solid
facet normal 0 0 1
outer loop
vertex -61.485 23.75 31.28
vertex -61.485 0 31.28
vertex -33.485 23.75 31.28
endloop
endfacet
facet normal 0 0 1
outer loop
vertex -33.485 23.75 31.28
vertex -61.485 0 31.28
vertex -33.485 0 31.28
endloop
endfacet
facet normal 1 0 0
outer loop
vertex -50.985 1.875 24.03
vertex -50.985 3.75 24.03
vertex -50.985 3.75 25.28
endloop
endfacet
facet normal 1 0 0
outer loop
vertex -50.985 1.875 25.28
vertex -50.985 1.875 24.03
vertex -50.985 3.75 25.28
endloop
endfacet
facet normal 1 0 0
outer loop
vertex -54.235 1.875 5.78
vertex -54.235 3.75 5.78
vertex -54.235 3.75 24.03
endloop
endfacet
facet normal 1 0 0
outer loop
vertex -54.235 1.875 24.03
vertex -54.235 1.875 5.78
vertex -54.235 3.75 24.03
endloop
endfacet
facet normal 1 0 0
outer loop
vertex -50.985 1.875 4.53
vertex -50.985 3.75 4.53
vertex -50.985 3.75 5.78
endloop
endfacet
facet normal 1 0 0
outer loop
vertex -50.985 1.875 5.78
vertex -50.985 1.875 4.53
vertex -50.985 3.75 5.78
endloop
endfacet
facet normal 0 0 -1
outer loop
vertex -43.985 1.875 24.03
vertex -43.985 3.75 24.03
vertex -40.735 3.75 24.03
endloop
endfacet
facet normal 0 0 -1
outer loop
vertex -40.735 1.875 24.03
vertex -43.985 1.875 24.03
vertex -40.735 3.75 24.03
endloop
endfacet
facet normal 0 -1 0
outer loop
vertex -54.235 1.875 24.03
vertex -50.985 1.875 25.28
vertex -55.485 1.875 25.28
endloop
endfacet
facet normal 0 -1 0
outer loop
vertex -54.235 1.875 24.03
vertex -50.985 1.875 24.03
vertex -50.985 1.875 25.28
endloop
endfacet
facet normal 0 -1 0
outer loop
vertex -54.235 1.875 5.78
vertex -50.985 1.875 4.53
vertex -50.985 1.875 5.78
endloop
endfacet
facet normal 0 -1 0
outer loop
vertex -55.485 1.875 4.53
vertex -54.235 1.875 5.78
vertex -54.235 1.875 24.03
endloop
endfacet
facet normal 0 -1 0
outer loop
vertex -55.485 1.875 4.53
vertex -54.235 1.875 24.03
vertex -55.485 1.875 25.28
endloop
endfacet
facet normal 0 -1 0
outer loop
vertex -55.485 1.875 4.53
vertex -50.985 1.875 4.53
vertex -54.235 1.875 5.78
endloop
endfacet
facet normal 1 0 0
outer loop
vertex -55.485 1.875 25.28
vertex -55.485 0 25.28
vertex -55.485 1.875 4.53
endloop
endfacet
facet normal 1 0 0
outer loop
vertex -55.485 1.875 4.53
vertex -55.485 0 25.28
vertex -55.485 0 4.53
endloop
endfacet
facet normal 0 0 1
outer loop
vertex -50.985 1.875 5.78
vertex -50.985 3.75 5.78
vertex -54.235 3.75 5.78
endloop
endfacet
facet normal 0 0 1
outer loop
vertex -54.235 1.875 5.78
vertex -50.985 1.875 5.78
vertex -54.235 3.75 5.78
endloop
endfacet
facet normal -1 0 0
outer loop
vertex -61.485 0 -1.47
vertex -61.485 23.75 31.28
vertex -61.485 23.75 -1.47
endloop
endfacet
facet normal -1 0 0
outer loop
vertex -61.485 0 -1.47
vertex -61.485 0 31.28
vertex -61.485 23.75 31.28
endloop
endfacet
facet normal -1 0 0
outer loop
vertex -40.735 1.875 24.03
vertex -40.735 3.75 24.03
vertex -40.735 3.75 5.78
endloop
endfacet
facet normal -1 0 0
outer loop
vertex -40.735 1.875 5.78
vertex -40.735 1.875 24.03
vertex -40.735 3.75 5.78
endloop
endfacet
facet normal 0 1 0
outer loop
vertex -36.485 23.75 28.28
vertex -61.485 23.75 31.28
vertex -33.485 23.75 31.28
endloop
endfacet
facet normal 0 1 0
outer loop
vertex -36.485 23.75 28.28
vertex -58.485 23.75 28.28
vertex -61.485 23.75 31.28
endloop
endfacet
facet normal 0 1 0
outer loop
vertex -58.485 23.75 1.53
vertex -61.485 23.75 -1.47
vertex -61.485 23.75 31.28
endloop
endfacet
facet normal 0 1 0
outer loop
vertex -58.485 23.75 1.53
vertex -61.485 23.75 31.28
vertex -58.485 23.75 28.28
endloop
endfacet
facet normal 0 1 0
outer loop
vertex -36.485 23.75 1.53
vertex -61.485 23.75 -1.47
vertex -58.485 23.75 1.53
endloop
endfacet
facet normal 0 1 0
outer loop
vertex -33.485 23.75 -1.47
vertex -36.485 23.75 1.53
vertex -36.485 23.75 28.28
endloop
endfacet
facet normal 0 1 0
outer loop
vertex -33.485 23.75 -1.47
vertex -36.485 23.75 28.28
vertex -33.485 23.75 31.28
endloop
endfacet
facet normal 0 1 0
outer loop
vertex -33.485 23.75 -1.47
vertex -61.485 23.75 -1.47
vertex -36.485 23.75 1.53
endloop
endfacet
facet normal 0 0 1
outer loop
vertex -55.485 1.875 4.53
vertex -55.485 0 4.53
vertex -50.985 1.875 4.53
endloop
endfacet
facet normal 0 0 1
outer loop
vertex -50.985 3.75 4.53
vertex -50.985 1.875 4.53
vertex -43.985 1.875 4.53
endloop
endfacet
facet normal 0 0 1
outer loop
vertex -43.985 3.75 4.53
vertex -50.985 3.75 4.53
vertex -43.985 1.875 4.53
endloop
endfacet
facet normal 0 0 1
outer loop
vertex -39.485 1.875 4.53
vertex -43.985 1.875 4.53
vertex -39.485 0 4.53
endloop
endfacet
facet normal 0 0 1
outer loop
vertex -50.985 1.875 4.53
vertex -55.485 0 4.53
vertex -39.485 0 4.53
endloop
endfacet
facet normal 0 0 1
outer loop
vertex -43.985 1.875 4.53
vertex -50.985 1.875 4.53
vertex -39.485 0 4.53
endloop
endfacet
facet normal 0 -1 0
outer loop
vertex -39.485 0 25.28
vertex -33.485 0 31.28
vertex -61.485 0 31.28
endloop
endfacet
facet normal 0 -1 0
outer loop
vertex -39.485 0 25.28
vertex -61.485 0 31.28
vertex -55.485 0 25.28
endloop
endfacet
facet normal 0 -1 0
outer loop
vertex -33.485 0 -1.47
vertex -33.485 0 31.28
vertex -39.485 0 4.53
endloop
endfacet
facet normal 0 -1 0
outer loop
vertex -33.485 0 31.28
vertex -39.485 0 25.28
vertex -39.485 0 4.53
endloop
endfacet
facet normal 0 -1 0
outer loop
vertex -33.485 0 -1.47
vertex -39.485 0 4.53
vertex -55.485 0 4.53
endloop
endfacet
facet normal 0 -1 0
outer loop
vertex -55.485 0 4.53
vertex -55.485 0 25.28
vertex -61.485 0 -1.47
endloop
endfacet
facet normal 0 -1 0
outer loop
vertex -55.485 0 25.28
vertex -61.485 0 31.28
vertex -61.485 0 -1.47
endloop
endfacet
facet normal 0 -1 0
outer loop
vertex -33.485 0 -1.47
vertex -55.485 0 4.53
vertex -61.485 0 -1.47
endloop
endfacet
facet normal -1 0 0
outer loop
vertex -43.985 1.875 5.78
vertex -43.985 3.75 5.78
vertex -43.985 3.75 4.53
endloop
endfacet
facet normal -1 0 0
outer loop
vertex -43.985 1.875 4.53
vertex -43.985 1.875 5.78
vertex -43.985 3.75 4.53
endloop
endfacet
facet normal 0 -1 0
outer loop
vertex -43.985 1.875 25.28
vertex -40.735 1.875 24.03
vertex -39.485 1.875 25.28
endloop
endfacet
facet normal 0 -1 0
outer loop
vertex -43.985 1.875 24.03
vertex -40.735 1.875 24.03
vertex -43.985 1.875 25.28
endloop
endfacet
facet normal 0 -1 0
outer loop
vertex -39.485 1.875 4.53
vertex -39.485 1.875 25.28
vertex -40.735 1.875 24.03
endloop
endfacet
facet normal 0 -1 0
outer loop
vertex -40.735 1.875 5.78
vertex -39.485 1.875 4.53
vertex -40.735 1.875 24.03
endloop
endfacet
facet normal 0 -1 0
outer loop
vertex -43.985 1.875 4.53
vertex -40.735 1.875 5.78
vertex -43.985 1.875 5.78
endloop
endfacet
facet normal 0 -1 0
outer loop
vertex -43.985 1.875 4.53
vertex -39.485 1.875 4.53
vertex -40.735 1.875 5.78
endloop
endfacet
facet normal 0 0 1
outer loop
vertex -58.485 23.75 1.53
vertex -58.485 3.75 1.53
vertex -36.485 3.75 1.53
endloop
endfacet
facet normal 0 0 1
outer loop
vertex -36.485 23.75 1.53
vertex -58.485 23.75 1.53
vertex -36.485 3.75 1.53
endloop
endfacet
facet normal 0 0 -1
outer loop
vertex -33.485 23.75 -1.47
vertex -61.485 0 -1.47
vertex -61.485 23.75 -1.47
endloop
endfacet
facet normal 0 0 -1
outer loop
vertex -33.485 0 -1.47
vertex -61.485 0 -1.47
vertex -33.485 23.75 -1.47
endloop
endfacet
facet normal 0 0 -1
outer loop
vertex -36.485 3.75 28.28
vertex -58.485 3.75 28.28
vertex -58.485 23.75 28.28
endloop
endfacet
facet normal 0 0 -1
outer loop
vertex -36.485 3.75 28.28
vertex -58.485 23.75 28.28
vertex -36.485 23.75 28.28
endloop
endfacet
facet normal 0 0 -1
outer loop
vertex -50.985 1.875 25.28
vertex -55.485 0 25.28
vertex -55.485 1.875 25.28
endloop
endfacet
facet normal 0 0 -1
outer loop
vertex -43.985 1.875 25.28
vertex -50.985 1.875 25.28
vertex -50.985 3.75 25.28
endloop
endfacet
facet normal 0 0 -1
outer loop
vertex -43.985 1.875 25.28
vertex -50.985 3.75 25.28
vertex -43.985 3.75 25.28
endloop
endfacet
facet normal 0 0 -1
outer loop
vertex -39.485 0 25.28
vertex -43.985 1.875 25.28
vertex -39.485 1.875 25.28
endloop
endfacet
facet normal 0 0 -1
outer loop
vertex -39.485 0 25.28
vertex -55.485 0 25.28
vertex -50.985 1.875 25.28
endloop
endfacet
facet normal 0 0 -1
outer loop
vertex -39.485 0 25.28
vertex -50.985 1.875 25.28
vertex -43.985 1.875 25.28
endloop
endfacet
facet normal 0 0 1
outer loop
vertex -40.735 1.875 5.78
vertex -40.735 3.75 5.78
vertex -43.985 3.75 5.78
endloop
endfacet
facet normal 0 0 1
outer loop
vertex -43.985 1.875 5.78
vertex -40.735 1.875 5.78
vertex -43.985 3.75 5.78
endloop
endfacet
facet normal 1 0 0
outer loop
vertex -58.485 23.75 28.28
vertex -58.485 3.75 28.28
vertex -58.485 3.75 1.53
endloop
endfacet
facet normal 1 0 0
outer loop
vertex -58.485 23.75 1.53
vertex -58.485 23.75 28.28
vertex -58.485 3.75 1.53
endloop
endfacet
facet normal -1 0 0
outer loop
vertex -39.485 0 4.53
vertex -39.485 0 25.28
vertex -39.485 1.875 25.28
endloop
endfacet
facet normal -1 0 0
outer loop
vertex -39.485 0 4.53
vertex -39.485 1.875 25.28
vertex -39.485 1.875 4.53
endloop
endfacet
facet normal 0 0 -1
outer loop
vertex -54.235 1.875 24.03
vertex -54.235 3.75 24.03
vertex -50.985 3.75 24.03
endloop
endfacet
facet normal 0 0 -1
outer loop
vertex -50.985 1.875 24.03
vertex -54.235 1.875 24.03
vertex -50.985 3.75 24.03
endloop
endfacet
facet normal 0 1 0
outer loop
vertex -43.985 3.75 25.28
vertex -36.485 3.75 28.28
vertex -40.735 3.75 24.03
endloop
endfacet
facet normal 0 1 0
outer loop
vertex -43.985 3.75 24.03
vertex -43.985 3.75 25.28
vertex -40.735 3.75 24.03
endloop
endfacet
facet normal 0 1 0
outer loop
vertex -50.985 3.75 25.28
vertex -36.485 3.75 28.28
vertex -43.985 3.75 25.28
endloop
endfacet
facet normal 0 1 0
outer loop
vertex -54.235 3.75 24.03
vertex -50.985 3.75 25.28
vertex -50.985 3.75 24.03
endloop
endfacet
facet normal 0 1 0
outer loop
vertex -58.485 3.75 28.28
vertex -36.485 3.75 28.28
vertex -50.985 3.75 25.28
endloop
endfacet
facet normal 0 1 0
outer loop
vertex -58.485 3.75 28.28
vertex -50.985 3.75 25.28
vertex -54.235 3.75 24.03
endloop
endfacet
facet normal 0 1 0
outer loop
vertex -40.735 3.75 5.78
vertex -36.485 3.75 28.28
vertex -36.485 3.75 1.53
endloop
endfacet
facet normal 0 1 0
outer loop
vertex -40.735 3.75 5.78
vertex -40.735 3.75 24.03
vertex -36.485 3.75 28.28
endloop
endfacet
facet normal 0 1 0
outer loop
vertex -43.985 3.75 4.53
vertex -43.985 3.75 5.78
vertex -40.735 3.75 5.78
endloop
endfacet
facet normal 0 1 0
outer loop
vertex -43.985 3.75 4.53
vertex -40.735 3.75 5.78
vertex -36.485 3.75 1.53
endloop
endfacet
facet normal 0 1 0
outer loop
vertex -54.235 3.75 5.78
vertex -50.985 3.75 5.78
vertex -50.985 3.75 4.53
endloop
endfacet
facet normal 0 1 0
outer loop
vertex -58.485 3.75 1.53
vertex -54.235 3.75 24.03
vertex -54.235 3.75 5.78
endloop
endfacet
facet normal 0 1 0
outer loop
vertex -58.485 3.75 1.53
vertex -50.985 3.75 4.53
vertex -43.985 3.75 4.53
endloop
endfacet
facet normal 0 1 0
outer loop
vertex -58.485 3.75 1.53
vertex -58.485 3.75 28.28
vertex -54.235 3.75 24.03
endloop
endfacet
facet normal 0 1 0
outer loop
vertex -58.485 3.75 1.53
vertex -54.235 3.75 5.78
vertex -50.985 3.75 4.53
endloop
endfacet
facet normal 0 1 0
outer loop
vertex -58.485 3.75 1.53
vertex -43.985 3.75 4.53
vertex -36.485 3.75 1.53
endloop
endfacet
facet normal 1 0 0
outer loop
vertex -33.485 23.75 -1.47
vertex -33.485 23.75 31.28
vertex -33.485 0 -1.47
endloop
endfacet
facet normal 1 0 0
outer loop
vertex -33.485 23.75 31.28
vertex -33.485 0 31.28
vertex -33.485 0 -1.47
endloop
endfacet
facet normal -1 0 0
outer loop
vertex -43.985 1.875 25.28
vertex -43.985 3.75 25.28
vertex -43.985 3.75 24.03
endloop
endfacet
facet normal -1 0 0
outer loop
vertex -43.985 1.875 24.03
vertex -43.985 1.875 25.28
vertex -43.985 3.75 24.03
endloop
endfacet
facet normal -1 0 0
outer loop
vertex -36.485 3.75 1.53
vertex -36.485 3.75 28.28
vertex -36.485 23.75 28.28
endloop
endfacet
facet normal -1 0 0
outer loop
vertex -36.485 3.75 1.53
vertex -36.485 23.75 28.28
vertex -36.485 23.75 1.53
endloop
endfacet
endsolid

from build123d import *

# Parameters (mm, degrees)
SKETCH1_W           = 22
SKETCH1_H           = 26.75
SKETCH1_W_2         = 16
SKETCH1_H_2         = 20.75
BOSS_EXTRUDE2_DEPTH = 3.75
BOSS_EXTRUDE3_DEPTH = 1.875
SKETCH3_W           = 22
SKETCH3_H           = 3.75
BOSS_EXTRUDE4_DEPTH = 3
SKETCH4_W           = 29.75
SKETCH4_H           = 3.75
BOSS_EXTRUDE5_DEPTH = 3
SKETCH5_W           = 25
SKETCH5_H           = 3.75
BOSS_EXTRUDE6_DEPTH = 3
SKETCH6_W           = 32.75
SKETCH6_H           = 3.75
BOSS_EXTRUDE7_DEPTH = 3
SKETCH7_W           = 28
SKETCH7_H           = 32.75
SKETCH7_W_2         = 22
SKETCH7_H_2         = 26.75
BOSS_EXTRUDE8_DEPTH = 20


with BuildPart() as part:
    # Sketch1 → Boss-Extrude2 (new body)
    with BuildSketch(Plane(origin=(0, 0, 0), x_dir=(1, 0, 0), z_dir=(0, 1, 0))):
        with Locations((-47.484558715, -14.904779002)):
            Rectangle(SKETCH1_W, SKETCH1_H)
        with Locations((-47.484558715, -14.904779002)):
            Rectangle(SKETCH1_W_2, SKETCH1_H_2, mode=Mode.SUBTRACT)
    extrude(amount=BOSS_EXTRUDE2_DEPTH)

    # Sketch2 → Boss-Extrude3 (add)
    with BuildSketch(Plane(origin=(0, 3.75, 0), x_dir=(1, 0, 0), z_dir=(0, 1, 0))):
        Polygon((-50.984558715, -25.279779002), (-55.484558715, -25.279779002), (-55.484558715, -4.529779002), (-50.984558715, -4.529779002), (-50.984558715, -5.779779002), (-54.234558715, -5.779779002), (-54.234558715, -24.029779002), (-50.984558715, -24.029779002), align=None)
        Polygon((-43.984558715, -4.529779002), (-39.484558715, -4.529779002), (-39.484558715, -25.279779002), (-43.984558715, -25.279779002), (-43.984558715, -24.029779002), (-40.734558715, -24.029779002), (-40.734558715, -5.779779002), (-43.984558715, -5.779779002), align=None)
    extrude(amount=-BOSS_EXTRUDE3_DEPTH)

    # Sketch3 → Boss-Extrude4 (add)
    with BuildSketch(Plane(origin=(0, 0, 1.529779002), x_dir=(-1, 0, 0), z_dir=(0, 0, -1))):
        with Locations((47.484558715, 1.875)):
            Rectangle(SKETCH3_W, SKETCH3_H)
    extrude(amount=BOSS_EXTRUDE4_DEPTH)

    # Sketch4 → Boss-Extrude5 (add)
    with BuildSketch(Plane.ZY.offset(58.484558715)):
        with Locations((13.404779002, 1.875)):
            Rectangle(SKETCH4_W, SKETCH4_H)
    extrude(amount=BOSS_EXTRUDE5_DEPTH)

    # Sketch5 → Boss-Extrude6 (add)
    with BuildSketch(Plane.XY.offset(28.279779002)):
        with Locations((-48.984558715, 1.875)):
            Rectangle(SKETCH5_W, SKETCH5_H)
    extrude(amount=BOSS_EXTRUDE6_DEPTH)

    # Sketch6 → Boss-Extrude7 (add)
    with BuildSketch(Plane(origin=(-36.484558715, 0, 0), x_dir=(0, 0, -1), z_dir=(1, 0, 0))):
        with Locations((-14.904779002, 1.875)):
            Rectangle(SKETCH6_W, SKETCH6_H)
    extrude(amount=BOSS_EXTRUDE7_DEPTH)

    # Sketch7 → Boss-Extrude8 (add)
    with BuildSketch(Plane(origin=(0, 3.75, 0), x_dir=(1, 0, 0), z_dir=(0, 1, 0))):
        with Locations((-47.484558715, -14.904779002)):
            Rectangle(SKETCH7_W, SKETCH7_H)
        with Locations((-47.484558715, -14.904779002)):
            Rectangle(SKETCH7_W_2, SKETCH7_H_2, mode=Mode.SUBTRACT)
    extrude(amount=BOSS_EXTRUDE8_DEPTH)


solid = part.part
